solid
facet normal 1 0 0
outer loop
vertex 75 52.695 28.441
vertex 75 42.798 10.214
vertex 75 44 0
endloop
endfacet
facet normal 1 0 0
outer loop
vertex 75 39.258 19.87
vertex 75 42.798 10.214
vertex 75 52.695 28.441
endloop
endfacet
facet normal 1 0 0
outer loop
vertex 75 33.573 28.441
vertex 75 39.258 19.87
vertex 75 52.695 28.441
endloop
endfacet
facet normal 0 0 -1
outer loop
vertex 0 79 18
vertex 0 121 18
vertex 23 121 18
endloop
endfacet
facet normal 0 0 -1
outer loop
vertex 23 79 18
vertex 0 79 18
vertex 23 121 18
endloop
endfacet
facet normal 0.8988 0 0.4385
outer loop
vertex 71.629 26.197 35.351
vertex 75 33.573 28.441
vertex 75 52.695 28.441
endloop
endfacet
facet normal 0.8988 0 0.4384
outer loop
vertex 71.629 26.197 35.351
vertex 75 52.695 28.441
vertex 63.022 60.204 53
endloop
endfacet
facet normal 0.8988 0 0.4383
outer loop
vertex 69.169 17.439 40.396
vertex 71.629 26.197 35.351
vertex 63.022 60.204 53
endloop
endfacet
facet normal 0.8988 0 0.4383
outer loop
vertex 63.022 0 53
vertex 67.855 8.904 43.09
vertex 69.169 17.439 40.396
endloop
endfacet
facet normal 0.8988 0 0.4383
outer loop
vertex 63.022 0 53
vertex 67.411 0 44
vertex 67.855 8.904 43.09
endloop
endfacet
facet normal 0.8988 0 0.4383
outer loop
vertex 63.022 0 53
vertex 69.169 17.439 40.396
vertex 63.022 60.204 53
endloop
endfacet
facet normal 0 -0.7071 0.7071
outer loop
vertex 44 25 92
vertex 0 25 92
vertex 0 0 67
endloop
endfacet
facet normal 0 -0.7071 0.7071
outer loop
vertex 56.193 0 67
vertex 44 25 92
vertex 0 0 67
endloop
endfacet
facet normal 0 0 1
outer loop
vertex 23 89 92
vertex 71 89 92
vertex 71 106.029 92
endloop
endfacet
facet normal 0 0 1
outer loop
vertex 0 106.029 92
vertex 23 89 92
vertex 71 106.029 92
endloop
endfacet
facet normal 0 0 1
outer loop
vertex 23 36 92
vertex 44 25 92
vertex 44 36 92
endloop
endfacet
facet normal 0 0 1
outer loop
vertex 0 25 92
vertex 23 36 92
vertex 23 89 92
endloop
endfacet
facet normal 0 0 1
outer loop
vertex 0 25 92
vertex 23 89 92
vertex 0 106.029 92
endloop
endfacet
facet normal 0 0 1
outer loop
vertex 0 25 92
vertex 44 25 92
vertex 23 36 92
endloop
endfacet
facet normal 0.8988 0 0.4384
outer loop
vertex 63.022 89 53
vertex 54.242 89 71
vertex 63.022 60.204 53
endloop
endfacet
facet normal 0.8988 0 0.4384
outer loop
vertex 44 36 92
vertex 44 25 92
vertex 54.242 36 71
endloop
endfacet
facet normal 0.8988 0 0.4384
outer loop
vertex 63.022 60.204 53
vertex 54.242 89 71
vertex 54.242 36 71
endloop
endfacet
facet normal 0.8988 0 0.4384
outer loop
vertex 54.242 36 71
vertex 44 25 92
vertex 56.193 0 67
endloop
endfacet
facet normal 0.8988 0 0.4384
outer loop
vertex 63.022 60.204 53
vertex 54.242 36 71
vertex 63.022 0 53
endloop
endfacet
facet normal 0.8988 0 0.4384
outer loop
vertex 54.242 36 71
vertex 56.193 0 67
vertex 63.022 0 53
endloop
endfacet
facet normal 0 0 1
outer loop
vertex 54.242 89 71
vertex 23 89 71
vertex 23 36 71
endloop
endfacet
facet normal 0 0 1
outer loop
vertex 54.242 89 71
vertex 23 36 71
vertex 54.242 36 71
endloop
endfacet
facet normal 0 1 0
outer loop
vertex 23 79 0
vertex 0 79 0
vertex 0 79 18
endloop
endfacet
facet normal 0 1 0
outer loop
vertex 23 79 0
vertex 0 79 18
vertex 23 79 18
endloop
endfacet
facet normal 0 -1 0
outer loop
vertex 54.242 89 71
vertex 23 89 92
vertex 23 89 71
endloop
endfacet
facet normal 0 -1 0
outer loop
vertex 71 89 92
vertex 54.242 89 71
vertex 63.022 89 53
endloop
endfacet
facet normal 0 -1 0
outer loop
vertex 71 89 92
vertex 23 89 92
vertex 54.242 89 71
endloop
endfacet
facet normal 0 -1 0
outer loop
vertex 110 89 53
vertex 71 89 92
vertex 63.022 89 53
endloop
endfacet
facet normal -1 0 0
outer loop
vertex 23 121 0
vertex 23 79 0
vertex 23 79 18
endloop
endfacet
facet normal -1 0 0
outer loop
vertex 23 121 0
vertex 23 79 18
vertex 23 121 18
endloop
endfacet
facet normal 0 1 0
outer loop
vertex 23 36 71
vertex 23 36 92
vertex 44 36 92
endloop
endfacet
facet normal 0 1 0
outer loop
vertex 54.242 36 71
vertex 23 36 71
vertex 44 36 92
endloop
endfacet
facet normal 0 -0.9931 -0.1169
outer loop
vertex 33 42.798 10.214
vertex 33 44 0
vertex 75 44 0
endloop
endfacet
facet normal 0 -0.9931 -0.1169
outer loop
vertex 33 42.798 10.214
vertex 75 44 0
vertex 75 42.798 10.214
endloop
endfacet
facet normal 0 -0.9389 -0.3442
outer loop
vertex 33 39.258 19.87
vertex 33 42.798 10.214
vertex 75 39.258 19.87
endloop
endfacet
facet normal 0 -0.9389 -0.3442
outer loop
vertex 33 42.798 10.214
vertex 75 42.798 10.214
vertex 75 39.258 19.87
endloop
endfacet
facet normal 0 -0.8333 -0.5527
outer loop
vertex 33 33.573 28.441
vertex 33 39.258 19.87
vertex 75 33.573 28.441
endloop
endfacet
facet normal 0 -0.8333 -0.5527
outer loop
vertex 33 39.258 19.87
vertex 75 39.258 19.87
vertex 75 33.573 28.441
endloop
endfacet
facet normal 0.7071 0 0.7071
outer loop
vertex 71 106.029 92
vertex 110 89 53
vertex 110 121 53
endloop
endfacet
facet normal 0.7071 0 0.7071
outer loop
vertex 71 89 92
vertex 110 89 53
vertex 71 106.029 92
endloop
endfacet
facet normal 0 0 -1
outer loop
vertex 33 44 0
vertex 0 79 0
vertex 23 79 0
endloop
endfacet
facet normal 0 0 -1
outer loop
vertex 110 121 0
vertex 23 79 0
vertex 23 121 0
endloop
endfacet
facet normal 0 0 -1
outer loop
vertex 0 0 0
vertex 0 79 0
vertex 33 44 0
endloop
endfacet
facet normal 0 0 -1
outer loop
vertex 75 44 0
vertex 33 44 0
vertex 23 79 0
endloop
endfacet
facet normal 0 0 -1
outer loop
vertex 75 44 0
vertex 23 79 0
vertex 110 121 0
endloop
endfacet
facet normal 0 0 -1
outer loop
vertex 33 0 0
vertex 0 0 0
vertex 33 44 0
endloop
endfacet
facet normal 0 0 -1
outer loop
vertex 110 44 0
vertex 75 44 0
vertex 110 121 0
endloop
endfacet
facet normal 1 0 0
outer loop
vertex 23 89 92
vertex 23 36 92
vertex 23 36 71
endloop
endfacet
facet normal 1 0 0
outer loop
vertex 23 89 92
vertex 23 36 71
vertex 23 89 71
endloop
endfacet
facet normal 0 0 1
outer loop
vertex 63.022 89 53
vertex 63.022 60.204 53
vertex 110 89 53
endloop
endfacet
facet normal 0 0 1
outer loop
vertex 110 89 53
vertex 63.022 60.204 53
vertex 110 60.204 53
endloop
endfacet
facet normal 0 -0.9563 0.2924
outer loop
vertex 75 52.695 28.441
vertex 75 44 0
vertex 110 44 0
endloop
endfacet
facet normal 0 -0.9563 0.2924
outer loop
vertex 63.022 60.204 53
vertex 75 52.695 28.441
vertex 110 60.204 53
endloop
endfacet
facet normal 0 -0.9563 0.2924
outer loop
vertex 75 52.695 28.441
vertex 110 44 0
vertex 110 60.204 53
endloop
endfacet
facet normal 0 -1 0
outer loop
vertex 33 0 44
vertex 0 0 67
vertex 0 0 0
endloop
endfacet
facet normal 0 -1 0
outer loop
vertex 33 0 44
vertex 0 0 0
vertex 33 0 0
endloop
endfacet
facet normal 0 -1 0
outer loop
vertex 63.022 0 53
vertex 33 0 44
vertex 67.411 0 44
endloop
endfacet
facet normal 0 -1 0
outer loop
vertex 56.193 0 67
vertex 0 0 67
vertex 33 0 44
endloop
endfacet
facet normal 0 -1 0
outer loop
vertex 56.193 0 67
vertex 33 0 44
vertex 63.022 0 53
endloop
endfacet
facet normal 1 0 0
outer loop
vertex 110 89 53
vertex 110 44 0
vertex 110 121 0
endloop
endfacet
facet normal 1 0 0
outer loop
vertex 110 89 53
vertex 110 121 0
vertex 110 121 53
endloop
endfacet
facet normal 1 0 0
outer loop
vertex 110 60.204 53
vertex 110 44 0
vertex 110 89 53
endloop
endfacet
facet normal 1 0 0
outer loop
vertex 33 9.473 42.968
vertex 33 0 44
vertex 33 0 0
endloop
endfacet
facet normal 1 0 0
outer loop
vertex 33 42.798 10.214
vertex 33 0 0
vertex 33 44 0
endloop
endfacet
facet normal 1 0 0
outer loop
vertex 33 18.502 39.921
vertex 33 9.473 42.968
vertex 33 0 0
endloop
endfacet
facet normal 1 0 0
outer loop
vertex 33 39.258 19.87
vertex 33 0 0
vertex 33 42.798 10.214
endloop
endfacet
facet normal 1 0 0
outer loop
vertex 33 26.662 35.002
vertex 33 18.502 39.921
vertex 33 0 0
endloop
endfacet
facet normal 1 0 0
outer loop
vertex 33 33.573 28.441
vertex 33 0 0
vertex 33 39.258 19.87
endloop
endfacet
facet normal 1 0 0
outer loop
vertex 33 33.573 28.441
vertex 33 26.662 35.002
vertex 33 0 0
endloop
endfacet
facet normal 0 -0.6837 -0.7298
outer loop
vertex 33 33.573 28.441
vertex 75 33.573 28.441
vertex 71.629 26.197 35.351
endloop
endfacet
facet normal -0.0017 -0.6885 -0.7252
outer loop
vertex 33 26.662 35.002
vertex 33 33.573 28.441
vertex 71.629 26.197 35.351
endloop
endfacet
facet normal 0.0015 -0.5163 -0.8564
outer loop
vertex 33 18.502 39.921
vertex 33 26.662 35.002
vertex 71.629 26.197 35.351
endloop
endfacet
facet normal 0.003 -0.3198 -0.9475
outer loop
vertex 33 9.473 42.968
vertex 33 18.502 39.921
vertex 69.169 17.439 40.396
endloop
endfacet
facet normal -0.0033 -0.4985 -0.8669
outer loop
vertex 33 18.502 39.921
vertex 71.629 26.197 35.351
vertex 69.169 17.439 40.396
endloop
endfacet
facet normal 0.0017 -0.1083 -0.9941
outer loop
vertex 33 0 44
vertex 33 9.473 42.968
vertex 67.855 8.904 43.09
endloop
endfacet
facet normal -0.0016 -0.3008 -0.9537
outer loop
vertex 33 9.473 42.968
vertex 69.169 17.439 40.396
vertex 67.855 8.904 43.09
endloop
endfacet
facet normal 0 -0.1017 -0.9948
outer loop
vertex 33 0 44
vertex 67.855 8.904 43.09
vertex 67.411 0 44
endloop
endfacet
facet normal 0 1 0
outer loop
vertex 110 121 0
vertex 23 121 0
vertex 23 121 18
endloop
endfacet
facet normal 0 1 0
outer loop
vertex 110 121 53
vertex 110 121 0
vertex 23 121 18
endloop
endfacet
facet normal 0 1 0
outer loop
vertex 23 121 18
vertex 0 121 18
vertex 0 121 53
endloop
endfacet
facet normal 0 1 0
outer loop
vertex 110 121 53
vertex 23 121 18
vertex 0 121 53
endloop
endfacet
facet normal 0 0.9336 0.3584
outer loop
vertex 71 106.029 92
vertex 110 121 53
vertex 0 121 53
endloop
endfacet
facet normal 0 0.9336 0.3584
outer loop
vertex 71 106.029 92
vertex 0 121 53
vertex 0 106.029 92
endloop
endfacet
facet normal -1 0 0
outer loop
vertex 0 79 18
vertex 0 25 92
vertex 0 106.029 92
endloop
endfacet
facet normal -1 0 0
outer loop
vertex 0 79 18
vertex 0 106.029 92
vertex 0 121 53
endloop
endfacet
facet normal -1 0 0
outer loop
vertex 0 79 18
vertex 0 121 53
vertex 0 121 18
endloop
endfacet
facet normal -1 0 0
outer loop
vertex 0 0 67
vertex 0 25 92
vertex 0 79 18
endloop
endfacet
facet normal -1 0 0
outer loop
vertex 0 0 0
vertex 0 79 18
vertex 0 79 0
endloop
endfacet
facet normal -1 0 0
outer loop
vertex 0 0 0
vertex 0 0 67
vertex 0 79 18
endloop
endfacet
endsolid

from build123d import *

# Parameters (mm, degrees)
F3_DEPTH  = 172
F4_DEPTH  = 150
F7_DEPTH  = 111
F8_DEPTH  = 163
F10_DEPTH = 42
F11_DEPTH = 89
F14_DEPTH = 110
F17_W     = 21
F17_H     = 53
F18_DEPTH = 21
F1_W      = 23
F1_H      = 42
F19_DEPTH = 18


with BuildPart() as f3:
    # F0 (on Front) → F3 (new body)
    with BuildSketch(Plane.XZ):
        Polygon((0, 92), (0, 0), (75, 0), (75, 28.440581), (63.021571, 53), (44, 92), align=None)
    extrude(amount=-F3_DEPTH)

    # F2 (on Right) → F4 (intersect)
    with BuildSketch(Plane.YZ):
        Polygon((0, 67), (0, 0), (121, 0), (121, 53), (106.029303, 92), (25, 92), align=None)
    extrude(amount=F4_DEPTH, mode=Mode.INTERSECT)


with BuildPart() as f7:
    # F6 (on offset) → F7 (new body)
    with BuildSketch(Plane.XZ.offset(-44)):
        Polygon((0, 92), (0, 0), (110, 0), (110, 53), (71, 92), align=None)
    extrude(amount=-F7_DEPTH)


with BuildPart() as f8_tool:
    # F2 (on Right) → F8 (new body)
    with BuildSketch(Plane.YZ):
        Polygon((0, 67), (0, 0), (121, 0), (121, 53), (106.029303, 92), (25, 92), align=None)
    extrude(amount=F8_DEPTH)


with BuildPart() as f3_1:
    add(f3.part)

    # F8: intersect by f8_tool
    add(f8_tool.part, mode=Mode.INTERSECT)

    # F9 (on face) → F10 (cut)
    with BuildSketch(Plane.YZ.offset(75)):
        with BuildLine():
            Line((0, 0), (44, 0))
            ThreePointArc((44, 0), (41.311037, 15.145899), (33.572807, 28.440581))
            Line((33.572807, 28.440581), (0, 28.440581))
            Line((0, 28.440581), (0, 0))
        make_face()
        with BuildLine():
            ThreePointArc((33.572807, 28.440581), (-41.311037, -15.145899), (44, 0))
            Line((44, 0), (0, 0))
            Line((0, 0), (0, 28.440581))
            Line((0, 28.440581), (33.572807, 28.440581))
        make_face()
    extrude(amount=-F10_DEPTH, mode=Mode.SUBTRACT)


with BuildPart() as f7_1:
    add(f7.part)

    # F8: intersect by f8_tool
    add(f8_tool.part, mode=Mode.INTERSECT)


with BuildPart() as f11:
    # F0 (on Front) → F11 (new body)
    with BuildSketch(Plane.XZ):
        Polygon((113.488927, 92), (44, 92), (63.021571, 53), (113.488927, 53), align=None)
    extrude(amount=-F11_DEPTH)


with BuildPart() as f7_2:
    add(f7_1.part)

    # F12: cut F11
    add(f11.part, mode=Mode.SUBTRACT)


with BuildPart() as f14:
    # F13 (on face) → F14 (new body)
    with BuildSketch(Plane.YZ.offset(110)):
        Polygon((44, 53), (44, 0), (60.203726, 53), align=None)
    extrude(amount=-F14_DEPTH)


with BuildPart() as f7_3:
    add(f7_2.part)

    # F15: cut F14
    add(f14.part, mode=Mode.SUBTRACT)


with BuildPart() as f3_2:
    add(f3_1.part)

    # F16: union F7
    add(f7_3.part)

    # F17 (on face) → F18 (cut)
    with BuildSketch(Plane.XY.offset(92)):
        with Locations((33.5, 62.5)):
            Rectangle(F17_W, F17_H)
        Polygon((71, 89), (44, 89), (44, 36), (84.379675, 36), (84.379675, 89), align=None)
    extrude(amount=-F18_DEPTH, mode=Mode.SUBTRACT)

    # F1 (on Top) → F19 (cut)
    with BuildSketch(Plane.XY):
        with Locations((11.5, 100)):
            Rectangle(F1_W, F1_H)
    extrude(amount=F19_DEPTH, mode=Mode.SUBTRACT)


solid = f3_2.part
